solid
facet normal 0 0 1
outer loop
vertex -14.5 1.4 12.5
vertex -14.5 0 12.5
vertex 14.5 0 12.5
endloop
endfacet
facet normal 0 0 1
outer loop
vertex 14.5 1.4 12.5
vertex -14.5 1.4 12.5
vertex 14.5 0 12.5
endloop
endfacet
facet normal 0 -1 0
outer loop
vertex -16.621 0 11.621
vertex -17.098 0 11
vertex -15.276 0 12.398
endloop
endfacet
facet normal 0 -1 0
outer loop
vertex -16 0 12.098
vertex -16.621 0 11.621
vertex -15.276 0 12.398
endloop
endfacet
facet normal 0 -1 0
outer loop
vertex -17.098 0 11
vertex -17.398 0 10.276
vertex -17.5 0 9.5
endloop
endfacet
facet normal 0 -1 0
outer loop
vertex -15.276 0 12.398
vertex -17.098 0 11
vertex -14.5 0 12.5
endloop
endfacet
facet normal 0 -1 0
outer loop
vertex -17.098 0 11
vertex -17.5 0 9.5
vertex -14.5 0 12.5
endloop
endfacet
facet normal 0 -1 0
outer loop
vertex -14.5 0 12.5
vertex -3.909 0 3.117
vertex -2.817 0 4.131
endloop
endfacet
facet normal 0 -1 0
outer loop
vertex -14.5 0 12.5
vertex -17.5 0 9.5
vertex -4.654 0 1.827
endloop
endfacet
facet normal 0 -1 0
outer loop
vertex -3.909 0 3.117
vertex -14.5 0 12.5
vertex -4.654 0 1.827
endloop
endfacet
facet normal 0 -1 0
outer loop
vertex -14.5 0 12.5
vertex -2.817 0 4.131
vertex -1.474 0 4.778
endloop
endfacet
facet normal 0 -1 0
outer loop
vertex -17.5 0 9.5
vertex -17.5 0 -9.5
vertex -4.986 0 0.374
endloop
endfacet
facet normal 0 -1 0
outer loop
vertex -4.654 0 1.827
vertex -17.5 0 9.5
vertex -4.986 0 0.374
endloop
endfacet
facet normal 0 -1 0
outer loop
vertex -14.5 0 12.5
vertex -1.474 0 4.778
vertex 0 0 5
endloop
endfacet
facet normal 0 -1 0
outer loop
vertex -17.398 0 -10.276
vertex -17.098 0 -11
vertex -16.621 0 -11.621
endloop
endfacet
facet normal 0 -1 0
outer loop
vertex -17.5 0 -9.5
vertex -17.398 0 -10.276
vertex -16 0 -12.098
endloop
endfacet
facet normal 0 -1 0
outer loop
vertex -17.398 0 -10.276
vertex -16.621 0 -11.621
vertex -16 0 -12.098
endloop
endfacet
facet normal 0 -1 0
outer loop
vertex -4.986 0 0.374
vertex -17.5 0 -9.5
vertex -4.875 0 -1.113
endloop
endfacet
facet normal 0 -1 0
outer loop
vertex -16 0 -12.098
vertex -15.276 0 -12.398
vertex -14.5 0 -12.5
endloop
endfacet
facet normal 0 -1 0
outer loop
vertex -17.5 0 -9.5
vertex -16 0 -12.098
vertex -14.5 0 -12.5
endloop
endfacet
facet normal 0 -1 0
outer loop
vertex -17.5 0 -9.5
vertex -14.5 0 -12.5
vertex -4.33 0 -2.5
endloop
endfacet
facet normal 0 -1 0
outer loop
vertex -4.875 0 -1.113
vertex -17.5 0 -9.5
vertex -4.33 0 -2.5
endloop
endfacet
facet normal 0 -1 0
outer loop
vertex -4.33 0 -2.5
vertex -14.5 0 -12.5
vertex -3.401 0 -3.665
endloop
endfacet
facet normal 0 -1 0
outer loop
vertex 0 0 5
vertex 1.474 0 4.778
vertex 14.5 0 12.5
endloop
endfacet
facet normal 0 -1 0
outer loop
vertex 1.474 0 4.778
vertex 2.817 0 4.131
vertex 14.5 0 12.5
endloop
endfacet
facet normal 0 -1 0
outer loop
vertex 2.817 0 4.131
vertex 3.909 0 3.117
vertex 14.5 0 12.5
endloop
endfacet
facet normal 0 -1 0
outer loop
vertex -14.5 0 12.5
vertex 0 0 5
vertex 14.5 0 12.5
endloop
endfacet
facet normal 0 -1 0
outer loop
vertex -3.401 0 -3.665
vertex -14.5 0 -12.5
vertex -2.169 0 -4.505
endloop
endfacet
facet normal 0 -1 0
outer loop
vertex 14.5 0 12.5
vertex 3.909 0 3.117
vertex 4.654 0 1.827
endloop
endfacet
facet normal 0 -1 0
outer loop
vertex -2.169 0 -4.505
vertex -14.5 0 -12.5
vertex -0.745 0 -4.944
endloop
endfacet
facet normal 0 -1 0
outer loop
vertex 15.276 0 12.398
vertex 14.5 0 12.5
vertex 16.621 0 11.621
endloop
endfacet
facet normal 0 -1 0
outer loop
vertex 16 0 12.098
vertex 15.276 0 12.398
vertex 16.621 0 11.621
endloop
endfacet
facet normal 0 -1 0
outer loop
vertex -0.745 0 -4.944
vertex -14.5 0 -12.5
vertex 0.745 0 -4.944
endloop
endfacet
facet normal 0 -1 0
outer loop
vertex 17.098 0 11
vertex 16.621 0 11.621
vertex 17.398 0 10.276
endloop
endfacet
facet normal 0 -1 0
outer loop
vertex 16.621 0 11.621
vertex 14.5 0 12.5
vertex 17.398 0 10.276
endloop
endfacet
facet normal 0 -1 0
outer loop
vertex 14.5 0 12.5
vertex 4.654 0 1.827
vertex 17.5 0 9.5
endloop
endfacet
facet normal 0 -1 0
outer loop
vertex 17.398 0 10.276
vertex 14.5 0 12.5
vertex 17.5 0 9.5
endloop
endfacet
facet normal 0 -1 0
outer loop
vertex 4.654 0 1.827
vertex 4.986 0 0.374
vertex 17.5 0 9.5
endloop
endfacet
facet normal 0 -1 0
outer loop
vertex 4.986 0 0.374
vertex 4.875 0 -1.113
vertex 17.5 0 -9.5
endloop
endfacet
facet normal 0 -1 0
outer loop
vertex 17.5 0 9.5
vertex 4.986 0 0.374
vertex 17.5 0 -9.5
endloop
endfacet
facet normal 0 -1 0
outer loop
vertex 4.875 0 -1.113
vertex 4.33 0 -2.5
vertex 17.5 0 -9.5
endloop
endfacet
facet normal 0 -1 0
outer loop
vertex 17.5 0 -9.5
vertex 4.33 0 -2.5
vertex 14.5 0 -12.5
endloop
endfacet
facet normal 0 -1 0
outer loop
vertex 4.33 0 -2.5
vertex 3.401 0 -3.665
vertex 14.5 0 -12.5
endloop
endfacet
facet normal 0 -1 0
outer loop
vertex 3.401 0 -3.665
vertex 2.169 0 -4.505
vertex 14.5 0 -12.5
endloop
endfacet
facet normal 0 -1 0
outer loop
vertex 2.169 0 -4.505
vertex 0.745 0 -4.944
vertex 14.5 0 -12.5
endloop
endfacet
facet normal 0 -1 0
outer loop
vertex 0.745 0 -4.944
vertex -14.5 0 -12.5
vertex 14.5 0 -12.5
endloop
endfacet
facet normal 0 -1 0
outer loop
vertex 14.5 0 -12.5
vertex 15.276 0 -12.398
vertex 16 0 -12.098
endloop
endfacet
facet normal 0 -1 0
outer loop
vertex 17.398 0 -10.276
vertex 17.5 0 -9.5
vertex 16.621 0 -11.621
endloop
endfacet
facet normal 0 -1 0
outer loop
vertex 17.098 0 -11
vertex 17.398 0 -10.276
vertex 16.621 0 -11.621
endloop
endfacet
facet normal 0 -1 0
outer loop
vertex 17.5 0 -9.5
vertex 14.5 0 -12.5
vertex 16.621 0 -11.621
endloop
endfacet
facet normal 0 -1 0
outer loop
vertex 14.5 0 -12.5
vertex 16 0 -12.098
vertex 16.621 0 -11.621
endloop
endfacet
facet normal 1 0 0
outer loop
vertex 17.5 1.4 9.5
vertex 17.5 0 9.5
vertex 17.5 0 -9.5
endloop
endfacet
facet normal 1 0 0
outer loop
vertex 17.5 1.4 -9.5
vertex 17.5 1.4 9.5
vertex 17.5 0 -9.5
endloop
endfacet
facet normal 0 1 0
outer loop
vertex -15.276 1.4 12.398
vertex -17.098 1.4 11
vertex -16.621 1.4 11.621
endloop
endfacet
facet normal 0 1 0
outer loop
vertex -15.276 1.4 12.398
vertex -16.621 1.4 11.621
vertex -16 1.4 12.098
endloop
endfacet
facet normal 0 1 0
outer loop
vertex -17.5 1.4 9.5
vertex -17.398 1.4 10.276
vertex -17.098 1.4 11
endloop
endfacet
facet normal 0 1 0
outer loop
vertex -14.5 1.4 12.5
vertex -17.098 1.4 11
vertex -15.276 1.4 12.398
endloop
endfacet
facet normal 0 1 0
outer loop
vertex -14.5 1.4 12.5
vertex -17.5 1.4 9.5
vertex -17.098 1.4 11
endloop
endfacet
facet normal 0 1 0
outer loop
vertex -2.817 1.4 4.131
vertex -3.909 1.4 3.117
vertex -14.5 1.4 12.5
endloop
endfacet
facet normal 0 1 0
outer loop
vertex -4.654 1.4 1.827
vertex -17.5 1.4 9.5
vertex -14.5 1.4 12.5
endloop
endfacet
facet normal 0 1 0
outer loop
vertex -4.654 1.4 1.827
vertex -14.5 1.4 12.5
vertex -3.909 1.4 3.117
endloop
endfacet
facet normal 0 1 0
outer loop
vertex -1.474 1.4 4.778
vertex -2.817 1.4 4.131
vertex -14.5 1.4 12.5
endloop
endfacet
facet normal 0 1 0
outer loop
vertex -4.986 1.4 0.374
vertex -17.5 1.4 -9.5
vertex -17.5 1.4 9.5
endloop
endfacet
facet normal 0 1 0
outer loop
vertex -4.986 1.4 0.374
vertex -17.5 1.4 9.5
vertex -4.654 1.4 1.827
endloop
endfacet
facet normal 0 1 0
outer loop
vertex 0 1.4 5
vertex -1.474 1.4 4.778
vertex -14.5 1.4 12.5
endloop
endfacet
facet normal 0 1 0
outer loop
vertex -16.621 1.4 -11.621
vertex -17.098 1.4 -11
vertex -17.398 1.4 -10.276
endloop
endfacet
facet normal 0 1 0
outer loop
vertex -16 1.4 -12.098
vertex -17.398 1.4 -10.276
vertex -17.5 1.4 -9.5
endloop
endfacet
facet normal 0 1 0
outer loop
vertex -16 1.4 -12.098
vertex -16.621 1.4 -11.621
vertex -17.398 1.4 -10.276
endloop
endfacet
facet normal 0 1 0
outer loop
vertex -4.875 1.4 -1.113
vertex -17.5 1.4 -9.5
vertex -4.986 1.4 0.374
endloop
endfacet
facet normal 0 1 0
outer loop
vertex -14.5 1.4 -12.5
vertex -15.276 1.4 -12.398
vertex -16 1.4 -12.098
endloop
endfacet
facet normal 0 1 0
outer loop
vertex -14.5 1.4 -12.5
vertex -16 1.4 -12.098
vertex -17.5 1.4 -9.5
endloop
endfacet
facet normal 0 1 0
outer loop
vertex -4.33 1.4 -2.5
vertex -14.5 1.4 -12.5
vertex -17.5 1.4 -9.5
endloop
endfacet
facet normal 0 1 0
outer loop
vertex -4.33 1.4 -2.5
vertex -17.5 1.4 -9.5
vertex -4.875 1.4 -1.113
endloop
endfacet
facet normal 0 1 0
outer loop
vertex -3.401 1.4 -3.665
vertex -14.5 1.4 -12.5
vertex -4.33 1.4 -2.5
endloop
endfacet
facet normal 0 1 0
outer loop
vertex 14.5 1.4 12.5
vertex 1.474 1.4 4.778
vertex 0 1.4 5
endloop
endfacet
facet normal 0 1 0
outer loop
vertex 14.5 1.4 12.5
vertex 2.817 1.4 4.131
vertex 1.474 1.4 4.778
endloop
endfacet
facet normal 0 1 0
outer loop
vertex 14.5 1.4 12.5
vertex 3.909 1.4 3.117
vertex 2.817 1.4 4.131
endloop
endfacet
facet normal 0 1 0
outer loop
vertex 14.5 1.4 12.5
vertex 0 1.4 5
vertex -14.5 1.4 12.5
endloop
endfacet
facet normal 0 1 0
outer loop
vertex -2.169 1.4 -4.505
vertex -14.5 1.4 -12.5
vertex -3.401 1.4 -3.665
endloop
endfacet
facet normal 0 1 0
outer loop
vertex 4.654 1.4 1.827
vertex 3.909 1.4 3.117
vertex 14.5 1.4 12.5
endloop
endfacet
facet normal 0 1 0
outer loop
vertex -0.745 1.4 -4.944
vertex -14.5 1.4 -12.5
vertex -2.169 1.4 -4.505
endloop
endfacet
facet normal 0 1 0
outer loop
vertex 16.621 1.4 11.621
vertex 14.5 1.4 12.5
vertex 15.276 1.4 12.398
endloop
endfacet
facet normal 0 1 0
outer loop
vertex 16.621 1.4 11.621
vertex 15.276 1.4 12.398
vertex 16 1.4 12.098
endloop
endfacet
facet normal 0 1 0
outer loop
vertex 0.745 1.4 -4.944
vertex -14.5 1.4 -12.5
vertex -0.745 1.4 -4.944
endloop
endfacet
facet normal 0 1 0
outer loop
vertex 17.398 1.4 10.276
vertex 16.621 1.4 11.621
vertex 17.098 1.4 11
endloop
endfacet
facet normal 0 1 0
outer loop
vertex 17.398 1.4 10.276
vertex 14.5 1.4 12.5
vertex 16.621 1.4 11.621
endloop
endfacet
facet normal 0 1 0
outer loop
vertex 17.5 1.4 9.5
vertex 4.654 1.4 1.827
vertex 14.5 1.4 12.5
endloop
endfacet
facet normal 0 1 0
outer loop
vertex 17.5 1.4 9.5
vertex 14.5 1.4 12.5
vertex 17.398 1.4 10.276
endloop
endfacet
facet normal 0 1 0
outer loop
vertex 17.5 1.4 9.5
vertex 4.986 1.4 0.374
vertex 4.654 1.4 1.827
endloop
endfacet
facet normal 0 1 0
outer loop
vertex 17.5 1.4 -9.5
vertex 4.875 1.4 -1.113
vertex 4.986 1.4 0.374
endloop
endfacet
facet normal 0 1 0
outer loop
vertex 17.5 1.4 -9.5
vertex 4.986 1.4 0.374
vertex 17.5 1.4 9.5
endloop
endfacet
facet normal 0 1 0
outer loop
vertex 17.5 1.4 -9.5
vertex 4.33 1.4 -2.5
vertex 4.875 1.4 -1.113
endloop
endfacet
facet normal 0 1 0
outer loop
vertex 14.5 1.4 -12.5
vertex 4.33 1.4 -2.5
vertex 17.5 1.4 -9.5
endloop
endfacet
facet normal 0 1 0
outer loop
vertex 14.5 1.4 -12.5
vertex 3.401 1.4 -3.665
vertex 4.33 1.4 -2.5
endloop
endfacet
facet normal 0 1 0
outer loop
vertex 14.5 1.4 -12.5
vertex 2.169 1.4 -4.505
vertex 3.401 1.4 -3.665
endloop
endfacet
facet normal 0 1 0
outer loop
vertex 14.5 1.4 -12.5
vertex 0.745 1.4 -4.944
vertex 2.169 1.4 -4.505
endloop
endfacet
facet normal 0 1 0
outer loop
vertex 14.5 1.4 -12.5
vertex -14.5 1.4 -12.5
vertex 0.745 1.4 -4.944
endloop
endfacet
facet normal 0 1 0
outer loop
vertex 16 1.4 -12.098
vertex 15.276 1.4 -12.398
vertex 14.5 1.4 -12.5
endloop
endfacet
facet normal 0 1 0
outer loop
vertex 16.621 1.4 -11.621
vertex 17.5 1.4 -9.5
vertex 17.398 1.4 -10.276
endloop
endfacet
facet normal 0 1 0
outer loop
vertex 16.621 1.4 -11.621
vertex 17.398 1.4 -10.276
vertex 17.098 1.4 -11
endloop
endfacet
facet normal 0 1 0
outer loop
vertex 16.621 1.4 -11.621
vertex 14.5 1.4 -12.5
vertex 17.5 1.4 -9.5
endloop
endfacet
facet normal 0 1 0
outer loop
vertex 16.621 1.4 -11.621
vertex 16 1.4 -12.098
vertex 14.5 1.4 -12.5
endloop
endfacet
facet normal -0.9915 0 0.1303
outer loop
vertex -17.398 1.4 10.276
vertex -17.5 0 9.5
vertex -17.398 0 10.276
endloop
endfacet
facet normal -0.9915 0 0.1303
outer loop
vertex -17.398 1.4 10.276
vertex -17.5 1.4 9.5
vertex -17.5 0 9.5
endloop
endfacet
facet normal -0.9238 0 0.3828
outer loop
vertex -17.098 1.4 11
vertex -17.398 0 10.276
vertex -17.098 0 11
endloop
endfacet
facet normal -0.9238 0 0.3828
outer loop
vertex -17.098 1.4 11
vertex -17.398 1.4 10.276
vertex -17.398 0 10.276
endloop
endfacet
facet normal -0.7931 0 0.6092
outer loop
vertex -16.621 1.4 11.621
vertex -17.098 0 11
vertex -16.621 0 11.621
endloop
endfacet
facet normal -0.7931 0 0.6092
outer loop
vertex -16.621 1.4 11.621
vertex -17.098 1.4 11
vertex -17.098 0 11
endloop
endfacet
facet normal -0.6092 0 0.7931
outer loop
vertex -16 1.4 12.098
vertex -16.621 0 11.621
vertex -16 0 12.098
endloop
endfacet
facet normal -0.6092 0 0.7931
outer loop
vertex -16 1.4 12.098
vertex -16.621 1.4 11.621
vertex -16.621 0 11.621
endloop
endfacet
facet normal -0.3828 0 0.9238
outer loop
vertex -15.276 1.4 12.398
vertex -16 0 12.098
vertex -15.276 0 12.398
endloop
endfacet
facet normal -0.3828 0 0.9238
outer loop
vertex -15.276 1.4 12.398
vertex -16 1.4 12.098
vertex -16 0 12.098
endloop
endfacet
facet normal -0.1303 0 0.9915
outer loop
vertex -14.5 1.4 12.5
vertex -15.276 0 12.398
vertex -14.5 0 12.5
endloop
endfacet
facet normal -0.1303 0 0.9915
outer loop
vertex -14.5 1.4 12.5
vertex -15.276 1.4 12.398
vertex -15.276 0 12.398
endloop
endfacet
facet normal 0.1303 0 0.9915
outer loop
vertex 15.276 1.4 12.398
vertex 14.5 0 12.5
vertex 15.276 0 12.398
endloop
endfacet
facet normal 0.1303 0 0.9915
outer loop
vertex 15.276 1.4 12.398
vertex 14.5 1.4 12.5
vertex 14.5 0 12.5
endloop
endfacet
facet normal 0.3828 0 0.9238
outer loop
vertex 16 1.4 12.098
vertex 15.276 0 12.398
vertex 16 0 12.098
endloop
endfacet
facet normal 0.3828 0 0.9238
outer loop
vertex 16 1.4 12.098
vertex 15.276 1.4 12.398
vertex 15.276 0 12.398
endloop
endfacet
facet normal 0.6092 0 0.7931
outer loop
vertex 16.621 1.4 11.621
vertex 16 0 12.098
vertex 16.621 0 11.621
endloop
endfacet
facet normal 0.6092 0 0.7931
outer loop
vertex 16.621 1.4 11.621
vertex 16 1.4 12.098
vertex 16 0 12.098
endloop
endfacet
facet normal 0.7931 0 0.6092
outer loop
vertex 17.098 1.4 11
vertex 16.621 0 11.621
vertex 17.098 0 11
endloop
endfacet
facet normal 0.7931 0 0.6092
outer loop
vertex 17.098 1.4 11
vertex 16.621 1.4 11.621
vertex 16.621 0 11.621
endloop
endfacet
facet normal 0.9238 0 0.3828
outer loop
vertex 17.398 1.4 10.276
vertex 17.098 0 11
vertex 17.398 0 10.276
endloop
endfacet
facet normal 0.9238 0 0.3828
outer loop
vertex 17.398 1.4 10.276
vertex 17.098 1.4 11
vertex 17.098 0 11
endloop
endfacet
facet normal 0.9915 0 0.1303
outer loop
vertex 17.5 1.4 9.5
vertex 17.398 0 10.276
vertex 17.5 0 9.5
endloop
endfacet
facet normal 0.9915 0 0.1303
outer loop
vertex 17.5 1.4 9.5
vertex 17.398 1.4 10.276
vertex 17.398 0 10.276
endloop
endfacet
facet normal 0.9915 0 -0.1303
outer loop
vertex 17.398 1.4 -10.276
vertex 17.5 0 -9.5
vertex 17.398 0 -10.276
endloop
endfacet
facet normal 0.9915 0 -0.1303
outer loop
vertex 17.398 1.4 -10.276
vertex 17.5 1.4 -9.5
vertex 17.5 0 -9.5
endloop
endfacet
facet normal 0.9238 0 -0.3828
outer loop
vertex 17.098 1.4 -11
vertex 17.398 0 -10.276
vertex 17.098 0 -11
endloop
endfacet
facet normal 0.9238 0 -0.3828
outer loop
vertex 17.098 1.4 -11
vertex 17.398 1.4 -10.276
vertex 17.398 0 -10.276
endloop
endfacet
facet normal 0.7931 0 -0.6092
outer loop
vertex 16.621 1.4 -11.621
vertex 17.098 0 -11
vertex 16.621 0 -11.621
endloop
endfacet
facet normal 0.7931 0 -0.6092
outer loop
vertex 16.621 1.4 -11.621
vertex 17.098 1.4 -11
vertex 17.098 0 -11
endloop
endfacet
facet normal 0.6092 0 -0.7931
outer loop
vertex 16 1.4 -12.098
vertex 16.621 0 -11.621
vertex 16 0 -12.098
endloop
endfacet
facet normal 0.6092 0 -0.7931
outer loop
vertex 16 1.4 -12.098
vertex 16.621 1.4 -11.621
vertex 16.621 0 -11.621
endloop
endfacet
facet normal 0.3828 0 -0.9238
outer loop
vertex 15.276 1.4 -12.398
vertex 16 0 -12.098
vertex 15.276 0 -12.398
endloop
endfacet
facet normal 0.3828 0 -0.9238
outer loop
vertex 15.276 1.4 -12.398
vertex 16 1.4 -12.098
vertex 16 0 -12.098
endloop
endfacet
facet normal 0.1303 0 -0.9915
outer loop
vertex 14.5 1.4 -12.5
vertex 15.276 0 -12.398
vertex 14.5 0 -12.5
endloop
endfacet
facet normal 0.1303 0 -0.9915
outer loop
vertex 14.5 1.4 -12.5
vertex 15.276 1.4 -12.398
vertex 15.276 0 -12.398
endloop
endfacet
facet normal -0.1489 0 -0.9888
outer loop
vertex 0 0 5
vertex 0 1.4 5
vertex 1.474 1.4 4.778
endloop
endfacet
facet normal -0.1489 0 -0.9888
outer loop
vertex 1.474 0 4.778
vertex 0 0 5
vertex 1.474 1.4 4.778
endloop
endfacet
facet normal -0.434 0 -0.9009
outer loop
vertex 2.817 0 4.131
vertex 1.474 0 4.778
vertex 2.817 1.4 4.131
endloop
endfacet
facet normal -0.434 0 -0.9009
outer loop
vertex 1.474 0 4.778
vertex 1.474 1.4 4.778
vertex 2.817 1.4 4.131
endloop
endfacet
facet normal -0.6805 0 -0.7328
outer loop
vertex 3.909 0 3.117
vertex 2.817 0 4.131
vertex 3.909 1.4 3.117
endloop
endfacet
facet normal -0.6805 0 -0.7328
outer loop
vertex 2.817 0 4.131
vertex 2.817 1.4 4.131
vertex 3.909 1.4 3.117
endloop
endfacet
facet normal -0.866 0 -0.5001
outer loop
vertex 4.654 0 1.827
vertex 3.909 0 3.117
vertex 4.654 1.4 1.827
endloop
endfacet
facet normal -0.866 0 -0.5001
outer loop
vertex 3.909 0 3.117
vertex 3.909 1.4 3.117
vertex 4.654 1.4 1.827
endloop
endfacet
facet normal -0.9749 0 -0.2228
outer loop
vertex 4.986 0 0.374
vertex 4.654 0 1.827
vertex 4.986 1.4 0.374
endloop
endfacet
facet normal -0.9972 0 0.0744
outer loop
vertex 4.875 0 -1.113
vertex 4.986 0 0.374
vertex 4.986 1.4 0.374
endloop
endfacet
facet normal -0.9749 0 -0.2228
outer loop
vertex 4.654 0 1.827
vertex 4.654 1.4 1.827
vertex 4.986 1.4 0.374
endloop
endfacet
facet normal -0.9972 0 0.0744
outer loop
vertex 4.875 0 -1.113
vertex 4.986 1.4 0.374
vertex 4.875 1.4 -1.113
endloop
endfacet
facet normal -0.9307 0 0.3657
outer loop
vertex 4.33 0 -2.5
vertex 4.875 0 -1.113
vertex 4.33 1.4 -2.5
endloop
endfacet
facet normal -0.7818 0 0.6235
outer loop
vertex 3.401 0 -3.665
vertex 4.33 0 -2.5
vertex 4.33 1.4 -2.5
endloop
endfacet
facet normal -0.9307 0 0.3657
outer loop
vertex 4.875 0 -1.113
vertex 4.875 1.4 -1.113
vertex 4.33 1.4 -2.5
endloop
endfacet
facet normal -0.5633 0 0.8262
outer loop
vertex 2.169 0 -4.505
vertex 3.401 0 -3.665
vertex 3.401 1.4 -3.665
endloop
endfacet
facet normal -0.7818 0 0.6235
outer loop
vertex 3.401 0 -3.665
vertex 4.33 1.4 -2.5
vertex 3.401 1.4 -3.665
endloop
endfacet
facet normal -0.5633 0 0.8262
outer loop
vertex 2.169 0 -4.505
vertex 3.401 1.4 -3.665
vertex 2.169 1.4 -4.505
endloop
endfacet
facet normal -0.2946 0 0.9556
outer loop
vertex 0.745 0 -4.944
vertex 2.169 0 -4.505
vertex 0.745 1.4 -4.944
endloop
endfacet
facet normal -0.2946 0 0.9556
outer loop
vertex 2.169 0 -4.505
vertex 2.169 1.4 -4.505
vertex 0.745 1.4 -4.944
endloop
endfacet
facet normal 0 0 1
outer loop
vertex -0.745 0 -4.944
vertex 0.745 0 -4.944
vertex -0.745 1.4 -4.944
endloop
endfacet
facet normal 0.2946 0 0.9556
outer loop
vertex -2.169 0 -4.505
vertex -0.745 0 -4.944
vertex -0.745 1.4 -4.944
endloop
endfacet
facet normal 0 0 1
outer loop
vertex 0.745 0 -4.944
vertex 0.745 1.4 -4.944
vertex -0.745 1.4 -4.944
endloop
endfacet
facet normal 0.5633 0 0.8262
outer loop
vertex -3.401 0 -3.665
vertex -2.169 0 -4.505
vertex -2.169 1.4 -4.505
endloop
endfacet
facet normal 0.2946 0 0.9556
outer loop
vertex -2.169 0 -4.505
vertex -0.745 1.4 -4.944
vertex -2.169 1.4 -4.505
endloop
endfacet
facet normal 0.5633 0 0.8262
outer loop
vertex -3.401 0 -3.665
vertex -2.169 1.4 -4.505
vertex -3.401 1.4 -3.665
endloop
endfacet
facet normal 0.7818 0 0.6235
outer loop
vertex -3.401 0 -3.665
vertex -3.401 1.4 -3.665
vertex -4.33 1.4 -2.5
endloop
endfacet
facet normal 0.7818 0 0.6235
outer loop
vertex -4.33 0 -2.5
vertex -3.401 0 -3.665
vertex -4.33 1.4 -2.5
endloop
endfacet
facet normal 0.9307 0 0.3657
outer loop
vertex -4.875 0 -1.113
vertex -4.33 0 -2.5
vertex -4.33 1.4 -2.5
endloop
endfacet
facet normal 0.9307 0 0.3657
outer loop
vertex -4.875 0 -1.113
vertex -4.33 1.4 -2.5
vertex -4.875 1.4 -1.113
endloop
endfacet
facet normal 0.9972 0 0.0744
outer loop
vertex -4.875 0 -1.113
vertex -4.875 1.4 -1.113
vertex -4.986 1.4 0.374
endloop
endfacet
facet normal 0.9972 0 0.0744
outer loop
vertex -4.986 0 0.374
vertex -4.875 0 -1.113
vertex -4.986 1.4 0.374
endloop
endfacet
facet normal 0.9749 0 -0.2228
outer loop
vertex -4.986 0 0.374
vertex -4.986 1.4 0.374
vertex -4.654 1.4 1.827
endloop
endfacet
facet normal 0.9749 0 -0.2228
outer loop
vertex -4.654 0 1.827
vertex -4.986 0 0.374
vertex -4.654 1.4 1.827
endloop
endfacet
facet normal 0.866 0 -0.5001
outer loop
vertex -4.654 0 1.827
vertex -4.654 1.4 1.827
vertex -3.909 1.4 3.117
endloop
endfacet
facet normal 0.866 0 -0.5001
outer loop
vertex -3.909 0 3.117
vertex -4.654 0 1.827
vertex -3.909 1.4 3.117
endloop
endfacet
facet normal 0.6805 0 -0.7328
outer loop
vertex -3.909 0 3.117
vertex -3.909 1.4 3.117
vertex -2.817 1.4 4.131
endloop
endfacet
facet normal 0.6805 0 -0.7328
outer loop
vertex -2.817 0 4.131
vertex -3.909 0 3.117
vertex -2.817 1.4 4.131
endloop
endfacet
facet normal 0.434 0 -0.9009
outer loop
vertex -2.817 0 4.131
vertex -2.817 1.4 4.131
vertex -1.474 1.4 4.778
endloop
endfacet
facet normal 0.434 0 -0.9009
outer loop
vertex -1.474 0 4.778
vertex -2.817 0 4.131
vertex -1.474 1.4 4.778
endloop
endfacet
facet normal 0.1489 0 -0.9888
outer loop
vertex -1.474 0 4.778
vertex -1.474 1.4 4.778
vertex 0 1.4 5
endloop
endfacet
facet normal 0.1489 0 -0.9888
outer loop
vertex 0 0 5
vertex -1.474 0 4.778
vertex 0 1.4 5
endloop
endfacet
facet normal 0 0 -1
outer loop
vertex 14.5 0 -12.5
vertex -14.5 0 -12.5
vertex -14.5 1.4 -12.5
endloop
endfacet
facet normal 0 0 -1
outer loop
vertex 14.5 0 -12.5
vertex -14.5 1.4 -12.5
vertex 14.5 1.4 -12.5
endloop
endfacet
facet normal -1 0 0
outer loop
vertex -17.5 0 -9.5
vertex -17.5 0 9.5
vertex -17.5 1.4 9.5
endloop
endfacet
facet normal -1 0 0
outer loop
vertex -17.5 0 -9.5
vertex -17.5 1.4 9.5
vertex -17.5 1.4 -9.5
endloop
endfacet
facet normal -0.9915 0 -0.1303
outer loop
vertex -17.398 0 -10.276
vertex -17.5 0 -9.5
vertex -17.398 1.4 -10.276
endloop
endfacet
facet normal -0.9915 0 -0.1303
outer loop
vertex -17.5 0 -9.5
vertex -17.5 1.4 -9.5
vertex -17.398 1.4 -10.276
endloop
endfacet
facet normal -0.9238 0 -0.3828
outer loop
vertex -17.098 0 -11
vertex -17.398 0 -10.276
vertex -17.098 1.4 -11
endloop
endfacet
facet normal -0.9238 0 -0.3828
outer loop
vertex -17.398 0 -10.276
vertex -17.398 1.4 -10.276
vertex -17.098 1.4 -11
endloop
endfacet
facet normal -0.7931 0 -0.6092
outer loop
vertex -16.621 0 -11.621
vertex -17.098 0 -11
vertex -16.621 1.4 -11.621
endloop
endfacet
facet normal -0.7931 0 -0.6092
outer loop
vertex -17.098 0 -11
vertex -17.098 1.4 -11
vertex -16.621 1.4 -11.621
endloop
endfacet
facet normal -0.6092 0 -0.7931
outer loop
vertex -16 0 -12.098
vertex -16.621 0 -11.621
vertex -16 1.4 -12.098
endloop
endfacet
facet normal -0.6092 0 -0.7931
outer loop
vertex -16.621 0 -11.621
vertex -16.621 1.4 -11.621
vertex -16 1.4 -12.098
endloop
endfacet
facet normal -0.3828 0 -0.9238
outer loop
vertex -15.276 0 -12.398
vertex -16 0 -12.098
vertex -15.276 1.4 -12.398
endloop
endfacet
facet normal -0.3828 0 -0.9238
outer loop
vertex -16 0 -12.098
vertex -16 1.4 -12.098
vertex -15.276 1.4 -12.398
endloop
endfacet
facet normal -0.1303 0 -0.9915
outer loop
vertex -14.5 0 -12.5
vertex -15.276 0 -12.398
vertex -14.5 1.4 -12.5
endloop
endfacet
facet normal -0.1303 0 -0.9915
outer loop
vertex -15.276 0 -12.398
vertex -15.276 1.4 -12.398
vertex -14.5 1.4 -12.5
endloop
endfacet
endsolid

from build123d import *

# Parameters (mm, degrees)
SKETCH2_W           = 35
SKETCH2_H           = 25
BOSS_EXTRUDE1_DEPTH = 1.4
FILLET1_R           = 3
SKETCH3_R           = 5
CUT_EXTRUDE1_DEPTH  = 22.551334065


with BuildPart() as part:
    # Sketch2 → Boss-Extrude1 (new body)
    with BuildSketch(Plane(origin=(0, 0, 0), x_dir=(1, 0, 0), z_dir=(0, 1, 0))):
        Rectangle(SKETCH2_W, SKETCH2_H)
    extrude(amount=BOSS_EXTRUDE1_DEPTH)

    # Fillet1
    fillet1_edges = [part.edges().sort_by_distance(p)[0] for p in [
        (17.5, 0.7, 12.5),
        (-17.5, 0.7, 12.5),
        (-17.5, 0.7, -12.5),
        (17.5, 0.7, -12.5),
    ]]
    fillet(fillet1_edges, radius=FILLET1_R)

    # Sketch3 → Cut-Extrude1 (cut, through all)
    with BuildSketch(Plane(origin=(0, 1.4, 0), x_dir=(1, 0, 0), z_dir=(0, 1, 0))):
        with Locations(Location((0, 0, 0), (0, 0, 270))):
            Circle(SKETCH3_R)
    extrude(amount=-CUT_EXTRUDE1_DEPTH, mode=Mode.SUBTRACT)


solid = part.part
